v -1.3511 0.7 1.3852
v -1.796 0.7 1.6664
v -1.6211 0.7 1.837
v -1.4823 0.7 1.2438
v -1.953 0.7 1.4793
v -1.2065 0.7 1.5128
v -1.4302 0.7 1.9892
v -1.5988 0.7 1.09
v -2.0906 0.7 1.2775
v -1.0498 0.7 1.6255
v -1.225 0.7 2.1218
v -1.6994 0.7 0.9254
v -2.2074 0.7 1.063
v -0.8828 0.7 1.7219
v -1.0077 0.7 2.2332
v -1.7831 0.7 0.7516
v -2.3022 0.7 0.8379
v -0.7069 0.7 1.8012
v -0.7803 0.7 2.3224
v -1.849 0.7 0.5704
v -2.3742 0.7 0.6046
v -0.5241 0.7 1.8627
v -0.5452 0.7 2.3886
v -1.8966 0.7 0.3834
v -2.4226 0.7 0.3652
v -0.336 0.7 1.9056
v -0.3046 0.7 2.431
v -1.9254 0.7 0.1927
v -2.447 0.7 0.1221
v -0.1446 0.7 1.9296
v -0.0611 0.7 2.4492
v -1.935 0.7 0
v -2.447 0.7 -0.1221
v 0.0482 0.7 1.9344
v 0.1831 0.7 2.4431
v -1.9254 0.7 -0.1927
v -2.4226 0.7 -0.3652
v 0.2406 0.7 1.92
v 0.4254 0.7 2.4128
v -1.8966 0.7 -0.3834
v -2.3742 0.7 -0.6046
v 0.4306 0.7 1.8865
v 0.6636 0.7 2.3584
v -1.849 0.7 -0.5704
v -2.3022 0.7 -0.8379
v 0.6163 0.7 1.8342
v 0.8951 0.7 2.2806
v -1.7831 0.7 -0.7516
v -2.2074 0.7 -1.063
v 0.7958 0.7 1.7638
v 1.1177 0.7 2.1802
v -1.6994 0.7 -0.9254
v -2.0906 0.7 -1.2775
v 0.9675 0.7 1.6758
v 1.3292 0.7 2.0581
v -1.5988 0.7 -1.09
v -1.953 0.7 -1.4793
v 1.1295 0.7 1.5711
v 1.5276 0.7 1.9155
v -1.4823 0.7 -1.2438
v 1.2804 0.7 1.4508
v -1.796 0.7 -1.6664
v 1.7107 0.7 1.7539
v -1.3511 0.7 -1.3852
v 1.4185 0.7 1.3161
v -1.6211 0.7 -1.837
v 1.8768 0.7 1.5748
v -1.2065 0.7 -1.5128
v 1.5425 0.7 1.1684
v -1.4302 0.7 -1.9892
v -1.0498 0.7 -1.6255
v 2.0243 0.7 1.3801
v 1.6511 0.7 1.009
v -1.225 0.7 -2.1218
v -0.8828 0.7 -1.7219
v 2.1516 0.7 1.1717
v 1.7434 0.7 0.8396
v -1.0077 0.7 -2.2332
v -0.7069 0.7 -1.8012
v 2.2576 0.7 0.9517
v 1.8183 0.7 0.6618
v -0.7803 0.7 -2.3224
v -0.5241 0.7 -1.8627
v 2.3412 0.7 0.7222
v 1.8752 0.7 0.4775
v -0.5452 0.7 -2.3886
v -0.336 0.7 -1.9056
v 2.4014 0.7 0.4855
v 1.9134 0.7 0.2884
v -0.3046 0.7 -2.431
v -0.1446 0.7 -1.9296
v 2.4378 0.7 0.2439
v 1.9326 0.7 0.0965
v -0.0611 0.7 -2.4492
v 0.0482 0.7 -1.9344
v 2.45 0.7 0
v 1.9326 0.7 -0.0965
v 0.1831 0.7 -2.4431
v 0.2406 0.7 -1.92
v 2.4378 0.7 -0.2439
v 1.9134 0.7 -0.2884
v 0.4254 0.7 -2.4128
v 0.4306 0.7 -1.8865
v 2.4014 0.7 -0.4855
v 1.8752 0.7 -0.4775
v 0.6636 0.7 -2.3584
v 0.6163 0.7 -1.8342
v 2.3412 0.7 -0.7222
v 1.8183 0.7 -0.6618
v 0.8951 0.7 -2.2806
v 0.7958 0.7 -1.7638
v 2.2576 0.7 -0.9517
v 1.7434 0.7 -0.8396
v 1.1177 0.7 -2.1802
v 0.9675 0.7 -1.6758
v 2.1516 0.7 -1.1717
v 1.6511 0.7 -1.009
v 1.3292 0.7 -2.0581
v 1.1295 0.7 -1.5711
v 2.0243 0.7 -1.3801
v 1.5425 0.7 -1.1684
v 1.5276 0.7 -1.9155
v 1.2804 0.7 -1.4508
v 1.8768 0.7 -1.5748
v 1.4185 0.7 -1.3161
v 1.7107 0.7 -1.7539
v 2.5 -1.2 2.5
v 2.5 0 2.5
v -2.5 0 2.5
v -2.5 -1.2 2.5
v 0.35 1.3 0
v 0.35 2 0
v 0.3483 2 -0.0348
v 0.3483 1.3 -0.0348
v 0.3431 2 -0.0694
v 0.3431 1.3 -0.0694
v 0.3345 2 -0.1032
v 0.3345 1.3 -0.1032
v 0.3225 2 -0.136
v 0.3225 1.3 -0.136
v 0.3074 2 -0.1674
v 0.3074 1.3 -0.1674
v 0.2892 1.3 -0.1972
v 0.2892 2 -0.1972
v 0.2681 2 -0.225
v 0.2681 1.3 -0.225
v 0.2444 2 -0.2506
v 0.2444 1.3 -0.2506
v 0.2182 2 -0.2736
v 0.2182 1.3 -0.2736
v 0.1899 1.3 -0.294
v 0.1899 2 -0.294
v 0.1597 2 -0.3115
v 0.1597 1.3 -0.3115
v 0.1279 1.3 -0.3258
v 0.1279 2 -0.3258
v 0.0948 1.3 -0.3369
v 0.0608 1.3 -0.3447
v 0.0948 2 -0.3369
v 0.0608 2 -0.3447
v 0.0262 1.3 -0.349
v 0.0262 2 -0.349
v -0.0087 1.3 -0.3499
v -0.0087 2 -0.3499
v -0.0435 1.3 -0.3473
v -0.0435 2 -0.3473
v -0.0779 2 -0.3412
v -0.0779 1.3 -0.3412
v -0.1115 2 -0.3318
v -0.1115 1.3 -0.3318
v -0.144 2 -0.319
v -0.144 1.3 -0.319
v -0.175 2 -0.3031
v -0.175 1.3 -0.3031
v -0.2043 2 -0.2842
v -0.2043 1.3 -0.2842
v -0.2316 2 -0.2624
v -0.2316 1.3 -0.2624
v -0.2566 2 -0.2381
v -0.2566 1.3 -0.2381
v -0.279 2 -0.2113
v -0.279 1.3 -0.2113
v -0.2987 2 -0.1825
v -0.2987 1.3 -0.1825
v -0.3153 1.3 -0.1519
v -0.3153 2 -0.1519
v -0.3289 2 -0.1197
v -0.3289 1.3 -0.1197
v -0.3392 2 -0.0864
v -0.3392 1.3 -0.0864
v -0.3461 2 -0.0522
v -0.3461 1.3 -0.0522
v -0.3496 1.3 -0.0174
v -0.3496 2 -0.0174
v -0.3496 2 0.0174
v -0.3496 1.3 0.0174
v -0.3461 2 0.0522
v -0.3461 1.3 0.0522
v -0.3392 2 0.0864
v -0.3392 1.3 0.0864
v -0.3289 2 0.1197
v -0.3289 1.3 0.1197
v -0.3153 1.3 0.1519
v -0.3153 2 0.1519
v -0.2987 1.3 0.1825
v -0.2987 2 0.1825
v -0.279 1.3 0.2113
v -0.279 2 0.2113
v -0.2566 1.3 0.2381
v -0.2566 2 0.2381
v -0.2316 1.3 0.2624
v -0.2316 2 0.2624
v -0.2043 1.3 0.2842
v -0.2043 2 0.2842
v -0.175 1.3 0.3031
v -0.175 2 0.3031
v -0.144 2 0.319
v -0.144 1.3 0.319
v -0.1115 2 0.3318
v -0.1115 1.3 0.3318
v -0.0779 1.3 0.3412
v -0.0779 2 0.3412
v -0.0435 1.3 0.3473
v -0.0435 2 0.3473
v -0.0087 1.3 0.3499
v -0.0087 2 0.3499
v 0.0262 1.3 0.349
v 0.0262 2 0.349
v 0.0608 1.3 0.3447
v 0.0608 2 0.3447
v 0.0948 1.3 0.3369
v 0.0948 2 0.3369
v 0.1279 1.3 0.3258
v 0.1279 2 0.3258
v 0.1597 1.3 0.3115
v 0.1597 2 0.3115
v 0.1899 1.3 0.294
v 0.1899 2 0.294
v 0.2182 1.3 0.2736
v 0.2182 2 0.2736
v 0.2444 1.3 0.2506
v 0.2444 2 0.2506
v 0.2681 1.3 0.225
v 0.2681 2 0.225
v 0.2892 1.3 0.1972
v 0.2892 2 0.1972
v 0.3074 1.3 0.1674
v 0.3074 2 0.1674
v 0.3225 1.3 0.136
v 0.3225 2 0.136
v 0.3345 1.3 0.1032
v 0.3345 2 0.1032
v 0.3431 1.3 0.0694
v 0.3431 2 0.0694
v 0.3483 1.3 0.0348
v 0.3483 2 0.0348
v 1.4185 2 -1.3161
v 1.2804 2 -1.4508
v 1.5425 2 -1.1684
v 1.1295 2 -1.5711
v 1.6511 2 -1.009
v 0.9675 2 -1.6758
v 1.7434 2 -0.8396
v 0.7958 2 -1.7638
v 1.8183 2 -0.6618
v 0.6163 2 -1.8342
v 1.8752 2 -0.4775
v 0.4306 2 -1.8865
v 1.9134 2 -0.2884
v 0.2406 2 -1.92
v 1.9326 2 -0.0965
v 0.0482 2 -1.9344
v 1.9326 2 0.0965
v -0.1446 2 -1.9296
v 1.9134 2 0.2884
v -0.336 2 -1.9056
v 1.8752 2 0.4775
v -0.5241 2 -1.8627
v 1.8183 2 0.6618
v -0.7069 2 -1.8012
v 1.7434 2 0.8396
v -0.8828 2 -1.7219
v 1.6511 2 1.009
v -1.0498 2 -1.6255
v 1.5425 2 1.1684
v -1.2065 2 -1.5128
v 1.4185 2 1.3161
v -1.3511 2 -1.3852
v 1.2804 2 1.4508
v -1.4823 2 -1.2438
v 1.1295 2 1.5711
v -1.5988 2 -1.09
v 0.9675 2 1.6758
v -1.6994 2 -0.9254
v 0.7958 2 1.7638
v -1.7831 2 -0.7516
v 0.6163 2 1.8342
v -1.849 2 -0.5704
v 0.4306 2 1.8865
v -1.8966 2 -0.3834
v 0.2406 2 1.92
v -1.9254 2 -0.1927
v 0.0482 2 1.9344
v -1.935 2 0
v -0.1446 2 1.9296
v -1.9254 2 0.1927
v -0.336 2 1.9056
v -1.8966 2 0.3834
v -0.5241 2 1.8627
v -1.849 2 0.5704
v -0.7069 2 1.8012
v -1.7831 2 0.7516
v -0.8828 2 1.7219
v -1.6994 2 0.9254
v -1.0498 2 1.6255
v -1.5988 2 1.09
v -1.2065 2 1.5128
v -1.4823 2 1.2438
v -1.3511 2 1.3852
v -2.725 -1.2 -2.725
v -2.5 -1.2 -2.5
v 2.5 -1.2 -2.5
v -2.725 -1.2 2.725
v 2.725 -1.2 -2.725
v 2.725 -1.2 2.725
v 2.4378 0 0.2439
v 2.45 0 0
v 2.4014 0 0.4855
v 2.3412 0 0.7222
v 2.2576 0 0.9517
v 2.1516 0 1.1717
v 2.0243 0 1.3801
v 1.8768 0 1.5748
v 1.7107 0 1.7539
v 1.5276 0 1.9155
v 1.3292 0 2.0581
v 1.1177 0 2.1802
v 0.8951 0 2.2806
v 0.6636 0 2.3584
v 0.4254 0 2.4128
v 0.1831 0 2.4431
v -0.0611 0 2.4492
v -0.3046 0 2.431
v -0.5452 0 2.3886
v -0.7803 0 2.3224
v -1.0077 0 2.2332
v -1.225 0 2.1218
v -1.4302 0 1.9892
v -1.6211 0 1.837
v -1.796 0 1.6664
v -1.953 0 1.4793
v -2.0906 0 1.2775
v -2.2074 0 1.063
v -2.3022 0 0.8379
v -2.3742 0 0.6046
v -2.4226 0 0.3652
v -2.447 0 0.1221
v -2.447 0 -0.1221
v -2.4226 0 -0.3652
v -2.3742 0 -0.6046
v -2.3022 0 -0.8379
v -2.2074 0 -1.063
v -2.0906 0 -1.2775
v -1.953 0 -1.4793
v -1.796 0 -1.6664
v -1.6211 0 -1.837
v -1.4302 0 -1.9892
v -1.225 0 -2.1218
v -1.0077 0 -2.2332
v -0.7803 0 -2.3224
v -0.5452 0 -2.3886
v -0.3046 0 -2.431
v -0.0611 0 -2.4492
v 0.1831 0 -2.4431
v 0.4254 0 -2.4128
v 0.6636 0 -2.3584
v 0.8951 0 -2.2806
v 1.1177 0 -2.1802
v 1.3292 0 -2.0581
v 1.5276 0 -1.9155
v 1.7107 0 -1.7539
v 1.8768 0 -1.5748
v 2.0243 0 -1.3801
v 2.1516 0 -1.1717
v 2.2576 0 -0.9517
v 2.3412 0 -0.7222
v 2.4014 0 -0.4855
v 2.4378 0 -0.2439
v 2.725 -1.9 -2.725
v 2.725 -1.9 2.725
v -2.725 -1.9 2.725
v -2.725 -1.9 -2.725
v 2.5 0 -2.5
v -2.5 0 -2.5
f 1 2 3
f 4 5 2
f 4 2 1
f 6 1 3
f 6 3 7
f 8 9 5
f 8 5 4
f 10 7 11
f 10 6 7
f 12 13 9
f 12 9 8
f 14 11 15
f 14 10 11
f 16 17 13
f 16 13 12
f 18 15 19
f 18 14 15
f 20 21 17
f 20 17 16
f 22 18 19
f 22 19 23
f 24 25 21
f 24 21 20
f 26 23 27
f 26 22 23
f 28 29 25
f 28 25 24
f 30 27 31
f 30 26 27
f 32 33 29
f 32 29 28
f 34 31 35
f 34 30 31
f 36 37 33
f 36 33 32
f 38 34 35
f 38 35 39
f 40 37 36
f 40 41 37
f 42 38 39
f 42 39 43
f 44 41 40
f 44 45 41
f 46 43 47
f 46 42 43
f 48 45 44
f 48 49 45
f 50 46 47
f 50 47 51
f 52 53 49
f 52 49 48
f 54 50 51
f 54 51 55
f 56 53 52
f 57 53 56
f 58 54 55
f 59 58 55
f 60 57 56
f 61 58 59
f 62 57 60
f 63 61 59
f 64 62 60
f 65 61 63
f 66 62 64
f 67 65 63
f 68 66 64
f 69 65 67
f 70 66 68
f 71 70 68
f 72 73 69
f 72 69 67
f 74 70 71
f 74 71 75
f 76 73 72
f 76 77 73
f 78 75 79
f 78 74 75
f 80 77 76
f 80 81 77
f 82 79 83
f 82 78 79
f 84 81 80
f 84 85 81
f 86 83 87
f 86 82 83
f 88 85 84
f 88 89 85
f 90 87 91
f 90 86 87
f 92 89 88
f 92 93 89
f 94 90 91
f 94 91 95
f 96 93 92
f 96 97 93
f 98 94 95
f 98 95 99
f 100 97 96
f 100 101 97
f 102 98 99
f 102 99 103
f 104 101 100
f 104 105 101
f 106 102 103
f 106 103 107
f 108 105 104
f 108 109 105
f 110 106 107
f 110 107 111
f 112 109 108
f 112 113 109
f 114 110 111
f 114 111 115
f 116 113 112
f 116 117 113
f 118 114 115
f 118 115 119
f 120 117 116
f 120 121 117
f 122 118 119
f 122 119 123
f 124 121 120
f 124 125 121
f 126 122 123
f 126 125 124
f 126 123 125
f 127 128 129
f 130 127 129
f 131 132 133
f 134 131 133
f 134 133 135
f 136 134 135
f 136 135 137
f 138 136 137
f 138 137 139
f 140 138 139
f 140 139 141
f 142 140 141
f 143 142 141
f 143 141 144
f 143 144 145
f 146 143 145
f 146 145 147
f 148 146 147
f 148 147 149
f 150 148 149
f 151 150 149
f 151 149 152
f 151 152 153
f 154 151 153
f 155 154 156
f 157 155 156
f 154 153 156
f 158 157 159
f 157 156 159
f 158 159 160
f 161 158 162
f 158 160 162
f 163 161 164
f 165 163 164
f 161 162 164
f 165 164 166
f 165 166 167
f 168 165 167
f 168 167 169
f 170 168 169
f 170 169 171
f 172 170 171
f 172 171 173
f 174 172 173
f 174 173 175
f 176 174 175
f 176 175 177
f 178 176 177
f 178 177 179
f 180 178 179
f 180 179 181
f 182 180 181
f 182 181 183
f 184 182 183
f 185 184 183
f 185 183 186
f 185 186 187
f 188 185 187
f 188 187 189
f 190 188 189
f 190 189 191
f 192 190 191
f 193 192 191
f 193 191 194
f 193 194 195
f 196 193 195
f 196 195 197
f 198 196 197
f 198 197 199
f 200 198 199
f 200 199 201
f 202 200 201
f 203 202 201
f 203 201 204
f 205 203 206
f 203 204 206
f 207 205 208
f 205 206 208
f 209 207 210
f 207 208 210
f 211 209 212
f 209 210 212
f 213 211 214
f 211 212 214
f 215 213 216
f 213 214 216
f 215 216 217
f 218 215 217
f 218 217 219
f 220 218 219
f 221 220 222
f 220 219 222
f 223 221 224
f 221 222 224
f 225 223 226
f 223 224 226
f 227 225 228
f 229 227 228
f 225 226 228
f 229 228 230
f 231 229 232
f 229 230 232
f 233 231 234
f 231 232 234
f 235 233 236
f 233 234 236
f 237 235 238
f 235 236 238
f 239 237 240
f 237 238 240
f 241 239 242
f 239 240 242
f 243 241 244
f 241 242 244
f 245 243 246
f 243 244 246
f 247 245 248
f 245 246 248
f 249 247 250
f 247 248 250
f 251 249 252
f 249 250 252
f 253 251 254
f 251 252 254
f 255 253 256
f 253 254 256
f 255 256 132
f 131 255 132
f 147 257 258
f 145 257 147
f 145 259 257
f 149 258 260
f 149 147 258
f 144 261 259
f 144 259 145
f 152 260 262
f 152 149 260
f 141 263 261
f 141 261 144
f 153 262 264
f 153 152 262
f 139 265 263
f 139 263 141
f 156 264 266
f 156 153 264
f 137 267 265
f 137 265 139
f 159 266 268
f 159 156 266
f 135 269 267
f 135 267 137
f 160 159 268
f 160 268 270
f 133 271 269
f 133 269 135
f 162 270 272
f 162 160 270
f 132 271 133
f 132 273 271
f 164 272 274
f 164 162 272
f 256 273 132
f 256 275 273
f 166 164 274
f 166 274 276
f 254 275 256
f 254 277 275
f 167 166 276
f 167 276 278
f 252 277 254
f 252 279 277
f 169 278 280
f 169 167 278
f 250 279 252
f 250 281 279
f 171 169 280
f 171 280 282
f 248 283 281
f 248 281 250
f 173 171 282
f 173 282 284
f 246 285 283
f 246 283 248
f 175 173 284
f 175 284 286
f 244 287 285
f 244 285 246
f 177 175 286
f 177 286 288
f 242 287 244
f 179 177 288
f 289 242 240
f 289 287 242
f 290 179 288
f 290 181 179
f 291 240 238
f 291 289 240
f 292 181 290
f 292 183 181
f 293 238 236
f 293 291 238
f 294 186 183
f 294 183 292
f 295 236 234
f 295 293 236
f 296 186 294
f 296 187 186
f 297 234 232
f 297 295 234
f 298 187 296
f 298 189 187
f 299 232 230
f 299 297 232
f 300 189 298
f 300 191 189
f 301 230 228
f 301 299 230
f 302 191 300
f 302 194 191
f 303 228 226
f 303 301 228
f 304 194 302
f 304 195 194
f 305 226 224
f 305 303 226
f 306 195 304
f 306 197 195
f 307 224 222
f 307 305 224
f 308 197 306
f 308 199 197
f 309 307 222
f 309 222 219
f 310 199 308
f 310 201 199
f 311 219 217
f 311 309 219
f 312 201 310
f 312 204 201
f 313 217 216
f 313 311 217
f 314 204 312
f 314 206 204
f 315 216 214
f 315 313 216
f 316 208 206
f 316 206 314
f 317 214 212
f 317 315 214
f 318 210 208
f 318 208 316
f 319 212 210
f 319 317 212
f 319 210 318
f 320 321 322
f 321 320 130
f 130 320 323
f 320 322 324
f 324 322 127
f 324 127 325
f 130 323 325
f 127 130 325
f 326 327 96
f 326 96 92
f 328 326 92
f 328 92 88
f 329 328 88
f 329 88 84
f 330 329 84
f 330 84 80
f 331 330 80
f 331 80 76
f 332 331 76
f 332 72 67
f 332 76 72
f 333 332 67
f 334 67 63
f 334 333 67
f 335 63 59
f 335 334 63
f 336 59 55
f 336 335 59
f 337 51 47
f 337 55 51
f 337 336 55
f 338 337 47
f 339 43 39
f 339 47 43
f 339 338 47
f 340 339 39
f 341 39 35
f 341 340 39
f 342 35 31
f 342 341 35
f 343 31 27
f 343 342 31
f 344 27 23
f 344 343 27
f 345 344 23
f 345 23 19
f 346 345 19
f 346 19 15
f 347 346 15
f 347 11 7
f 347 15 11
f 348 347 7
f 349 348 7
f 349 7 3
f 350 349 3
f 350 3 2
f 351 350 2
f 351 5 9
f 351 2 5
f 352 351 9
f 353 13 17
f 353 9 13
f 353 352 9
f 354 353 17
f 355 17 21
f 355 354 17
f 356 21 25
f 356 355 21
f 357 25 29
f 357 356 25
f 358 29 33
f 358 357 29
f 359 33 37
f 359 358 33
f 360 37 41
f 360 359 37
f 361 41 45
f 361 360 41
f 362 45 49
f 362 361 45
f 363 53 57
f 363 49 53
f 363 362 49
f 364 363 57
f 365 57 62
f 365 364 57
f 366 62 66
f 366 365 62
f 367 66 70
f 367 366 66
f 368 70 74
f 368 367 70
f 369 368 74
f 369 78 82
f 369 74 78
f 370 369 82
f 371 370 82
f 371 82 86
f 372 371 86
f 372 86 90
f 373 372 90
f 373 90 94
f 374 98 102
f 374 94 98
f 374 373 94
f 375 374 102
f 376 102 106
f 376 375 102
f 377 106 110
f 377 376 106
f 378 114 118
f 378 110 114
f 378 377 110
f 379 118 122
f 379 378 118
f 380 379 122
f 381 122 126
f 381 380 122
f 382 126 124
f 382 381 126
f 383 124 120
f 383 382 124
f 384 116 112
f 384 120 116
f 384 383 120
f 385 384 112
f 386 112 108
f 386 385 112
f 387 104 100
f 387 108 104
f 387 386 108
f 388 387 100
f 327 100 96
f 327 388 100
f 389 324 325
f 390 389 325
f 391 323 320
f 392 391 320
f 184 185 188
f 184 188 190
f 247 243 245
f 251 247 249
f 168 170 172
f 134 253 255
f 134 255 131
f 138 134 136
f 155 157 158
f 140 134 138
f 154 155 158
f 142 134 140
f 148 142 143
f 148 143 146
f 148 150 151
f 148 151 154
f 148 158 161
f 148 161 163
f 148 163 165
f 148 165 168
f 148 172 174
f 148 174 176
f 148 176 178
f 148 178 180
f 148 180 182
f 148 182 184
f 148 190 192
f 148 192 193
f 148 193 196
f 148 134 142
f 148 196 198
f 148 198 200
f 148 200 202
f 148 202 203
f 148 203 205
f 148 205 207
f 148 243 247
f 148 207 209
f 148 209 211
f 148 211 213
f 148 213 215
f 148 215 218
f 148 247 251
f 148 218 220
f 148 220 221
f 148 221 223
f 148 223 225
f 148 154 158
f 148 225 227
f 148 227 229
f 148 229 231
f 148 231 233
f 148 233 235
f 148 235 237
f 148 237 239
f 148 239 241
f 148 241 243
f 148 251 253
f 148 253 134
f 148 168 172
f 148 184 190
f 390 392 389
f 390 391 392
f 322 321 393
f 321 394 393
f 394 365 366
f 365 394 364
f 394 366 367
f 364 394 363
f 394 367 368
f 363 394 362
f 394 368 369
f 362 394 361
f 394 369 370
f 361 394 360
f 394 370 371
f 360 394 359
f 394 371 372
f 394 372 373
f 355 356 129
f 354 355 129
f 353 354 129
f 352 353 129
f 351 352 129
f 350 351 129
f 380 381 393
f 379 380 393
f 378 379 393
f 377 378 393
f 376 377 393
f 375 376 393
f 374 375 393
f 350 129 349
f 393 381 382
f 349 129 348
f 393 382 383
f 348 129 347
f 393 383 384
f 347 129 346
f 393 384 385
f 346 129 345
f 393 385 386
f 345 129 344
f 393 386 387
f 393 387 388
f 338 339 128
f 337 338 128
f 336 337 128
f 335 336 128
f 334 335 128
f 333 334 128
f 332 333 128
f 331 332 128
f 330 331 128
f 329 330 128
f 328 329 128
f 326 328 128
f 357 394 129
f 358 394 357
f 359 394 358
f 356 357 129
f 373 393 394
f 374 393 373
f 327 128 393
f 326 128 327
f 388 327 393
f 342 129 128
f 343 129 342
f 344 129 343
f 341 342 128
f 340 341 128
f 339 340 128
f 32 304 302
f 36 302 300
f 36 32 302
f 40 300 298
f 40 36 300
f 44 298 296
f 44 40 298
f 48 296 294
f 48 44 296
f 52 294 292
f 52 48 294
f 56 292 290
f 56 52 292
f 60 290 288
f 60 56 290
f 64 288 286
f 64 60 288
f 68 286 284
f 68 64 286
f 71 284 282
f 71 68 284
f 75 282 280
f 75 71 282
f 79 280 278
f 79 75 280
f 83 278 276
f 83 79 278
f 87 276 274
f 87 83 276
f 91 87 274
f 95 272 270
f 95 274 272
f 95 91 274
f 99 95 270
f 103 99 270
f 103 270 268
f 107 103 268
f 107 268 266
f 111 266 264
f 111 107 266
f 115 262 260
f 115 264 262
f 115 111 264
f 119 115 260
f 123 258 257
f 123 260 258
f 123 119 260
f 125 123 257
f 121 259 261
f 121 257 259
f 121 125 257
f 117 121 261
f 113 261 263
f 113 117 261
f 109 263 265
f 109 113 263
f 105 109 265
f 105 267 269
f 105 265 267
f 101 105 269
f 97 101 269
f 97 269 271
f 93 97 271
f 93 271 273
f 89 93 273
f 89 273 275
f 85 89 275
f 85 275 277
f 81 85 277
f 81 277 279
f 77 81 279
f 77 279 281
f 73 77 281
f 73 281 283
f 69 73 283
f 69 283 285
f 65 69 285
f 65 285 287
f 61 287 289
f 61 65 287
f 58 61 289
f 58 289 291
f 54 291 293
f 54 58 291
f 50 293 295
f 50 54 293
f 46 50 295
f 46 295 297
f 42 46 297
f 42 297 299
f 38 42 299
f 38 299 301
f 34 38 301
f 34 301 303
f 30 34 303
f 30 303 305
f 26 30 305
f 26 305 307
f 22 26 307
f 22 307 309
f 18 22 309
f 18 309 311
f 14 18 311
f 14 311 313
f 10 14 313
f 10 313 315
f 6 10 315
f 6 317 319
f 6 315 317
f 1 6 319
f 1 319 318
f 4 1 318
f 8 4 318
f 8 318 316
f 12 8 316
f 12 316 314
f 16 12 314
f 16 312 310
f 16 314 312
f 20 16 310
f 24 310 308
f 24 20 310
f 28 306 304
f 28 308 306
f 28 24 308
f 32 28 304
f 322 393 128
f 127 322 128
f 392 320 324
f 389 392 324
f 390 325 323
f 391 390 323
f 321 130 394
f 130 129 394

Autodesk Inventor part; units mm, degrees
ref_plane "YZ Plane" through (0, 0, 0) normal (1, 0, 0) x (0, 1, 0)
ref_plane "XZ Plane" through (0, 0, 0) normal (0, 1, 0) x (-1, 0, 0)
ref_plane "XY Plane" through (0, 0, 0) normal (0, 0, 1) x (1, 0, 0)
sketch "Sketch1" plane through (0, 0, 0) normal (0, 1, 0) x (-1, 0, 0)
  circle A0 centre (0, 0) radius 1.935
  dimension "d0" = 3.87
extrude "Extrusion1" add sketch "Sketch1" along normal blind 2
sketch "Sketch2" plane through (0, 0, 0) normal (0, -1, 0) x (1, 0, 0)
  line L0 (2.5, 2.5) -> (-2.5, 2.5)
  line L1 (-2.5, 2.5) -> (-2.5, -2.5)
  line L2 (-2.5, -2.5) -> (2.5, -2.5)
  line L3 (2.5, -2.5) -> (2.5, 2.5)
  line L4 (2.5, 2.5) -> (-2.5, -2.5) construction
  line L5 (-2.5, 2.5) -> (2.5, -2.5) construction
  point P0 (0, 0)
  dimension "d9" = 5
  dimension "d10" = 5
extrude "Extrusion2" add sketch "Sketch2" along normal blind 1.2
sketch "Sketch3" plane through (0, -1.2, 0) normal (0, -1, 0) x (1, 0, 0)
  line L0 (2.725, 2.725) -> (-2.725, 2.725)
  line L1 (-2.725, 2.725) -> (-2.725, -2.725)
  line L2 (-2.725, -2.725) -> (2.725, -2.725)
  line L3 (2.725, -2.725) -> (2.725, 2.725)
  line L4 (2.725, 2.725) -> (-2.725, -2.725) construction
  line L5 (-2.725, 2.725) -> (2.725, -2.725) construction
  point P0 (0, 0)
  dimension "d5" = 5.45
  dimension "d6" = 5.45
extrude "Extrusion3" add sketch "Sketch3" along normal blind 0.7
sketch "Sketch4" plane through (0, 0, 0) normal (0, 1, 0) x (1, 0, 0)
  circle A0 centre (0, 0) radius 2.45
  dimension "d11" = 4.9
extrude "Extrusion4" add sketch "Sketch4" along normal blind 0.7
sketch "Sketch5" plane through (0, 2, 0) normal (0, 1, 0) x (1, 0, 0)
  circle A0 centre (0, 0) radius 0.35
  dimension "d14" = 0.7
extrude "Extrusion5" cut sketch "Sketch5" against normal blind 0.7
properties part number "Camera"
